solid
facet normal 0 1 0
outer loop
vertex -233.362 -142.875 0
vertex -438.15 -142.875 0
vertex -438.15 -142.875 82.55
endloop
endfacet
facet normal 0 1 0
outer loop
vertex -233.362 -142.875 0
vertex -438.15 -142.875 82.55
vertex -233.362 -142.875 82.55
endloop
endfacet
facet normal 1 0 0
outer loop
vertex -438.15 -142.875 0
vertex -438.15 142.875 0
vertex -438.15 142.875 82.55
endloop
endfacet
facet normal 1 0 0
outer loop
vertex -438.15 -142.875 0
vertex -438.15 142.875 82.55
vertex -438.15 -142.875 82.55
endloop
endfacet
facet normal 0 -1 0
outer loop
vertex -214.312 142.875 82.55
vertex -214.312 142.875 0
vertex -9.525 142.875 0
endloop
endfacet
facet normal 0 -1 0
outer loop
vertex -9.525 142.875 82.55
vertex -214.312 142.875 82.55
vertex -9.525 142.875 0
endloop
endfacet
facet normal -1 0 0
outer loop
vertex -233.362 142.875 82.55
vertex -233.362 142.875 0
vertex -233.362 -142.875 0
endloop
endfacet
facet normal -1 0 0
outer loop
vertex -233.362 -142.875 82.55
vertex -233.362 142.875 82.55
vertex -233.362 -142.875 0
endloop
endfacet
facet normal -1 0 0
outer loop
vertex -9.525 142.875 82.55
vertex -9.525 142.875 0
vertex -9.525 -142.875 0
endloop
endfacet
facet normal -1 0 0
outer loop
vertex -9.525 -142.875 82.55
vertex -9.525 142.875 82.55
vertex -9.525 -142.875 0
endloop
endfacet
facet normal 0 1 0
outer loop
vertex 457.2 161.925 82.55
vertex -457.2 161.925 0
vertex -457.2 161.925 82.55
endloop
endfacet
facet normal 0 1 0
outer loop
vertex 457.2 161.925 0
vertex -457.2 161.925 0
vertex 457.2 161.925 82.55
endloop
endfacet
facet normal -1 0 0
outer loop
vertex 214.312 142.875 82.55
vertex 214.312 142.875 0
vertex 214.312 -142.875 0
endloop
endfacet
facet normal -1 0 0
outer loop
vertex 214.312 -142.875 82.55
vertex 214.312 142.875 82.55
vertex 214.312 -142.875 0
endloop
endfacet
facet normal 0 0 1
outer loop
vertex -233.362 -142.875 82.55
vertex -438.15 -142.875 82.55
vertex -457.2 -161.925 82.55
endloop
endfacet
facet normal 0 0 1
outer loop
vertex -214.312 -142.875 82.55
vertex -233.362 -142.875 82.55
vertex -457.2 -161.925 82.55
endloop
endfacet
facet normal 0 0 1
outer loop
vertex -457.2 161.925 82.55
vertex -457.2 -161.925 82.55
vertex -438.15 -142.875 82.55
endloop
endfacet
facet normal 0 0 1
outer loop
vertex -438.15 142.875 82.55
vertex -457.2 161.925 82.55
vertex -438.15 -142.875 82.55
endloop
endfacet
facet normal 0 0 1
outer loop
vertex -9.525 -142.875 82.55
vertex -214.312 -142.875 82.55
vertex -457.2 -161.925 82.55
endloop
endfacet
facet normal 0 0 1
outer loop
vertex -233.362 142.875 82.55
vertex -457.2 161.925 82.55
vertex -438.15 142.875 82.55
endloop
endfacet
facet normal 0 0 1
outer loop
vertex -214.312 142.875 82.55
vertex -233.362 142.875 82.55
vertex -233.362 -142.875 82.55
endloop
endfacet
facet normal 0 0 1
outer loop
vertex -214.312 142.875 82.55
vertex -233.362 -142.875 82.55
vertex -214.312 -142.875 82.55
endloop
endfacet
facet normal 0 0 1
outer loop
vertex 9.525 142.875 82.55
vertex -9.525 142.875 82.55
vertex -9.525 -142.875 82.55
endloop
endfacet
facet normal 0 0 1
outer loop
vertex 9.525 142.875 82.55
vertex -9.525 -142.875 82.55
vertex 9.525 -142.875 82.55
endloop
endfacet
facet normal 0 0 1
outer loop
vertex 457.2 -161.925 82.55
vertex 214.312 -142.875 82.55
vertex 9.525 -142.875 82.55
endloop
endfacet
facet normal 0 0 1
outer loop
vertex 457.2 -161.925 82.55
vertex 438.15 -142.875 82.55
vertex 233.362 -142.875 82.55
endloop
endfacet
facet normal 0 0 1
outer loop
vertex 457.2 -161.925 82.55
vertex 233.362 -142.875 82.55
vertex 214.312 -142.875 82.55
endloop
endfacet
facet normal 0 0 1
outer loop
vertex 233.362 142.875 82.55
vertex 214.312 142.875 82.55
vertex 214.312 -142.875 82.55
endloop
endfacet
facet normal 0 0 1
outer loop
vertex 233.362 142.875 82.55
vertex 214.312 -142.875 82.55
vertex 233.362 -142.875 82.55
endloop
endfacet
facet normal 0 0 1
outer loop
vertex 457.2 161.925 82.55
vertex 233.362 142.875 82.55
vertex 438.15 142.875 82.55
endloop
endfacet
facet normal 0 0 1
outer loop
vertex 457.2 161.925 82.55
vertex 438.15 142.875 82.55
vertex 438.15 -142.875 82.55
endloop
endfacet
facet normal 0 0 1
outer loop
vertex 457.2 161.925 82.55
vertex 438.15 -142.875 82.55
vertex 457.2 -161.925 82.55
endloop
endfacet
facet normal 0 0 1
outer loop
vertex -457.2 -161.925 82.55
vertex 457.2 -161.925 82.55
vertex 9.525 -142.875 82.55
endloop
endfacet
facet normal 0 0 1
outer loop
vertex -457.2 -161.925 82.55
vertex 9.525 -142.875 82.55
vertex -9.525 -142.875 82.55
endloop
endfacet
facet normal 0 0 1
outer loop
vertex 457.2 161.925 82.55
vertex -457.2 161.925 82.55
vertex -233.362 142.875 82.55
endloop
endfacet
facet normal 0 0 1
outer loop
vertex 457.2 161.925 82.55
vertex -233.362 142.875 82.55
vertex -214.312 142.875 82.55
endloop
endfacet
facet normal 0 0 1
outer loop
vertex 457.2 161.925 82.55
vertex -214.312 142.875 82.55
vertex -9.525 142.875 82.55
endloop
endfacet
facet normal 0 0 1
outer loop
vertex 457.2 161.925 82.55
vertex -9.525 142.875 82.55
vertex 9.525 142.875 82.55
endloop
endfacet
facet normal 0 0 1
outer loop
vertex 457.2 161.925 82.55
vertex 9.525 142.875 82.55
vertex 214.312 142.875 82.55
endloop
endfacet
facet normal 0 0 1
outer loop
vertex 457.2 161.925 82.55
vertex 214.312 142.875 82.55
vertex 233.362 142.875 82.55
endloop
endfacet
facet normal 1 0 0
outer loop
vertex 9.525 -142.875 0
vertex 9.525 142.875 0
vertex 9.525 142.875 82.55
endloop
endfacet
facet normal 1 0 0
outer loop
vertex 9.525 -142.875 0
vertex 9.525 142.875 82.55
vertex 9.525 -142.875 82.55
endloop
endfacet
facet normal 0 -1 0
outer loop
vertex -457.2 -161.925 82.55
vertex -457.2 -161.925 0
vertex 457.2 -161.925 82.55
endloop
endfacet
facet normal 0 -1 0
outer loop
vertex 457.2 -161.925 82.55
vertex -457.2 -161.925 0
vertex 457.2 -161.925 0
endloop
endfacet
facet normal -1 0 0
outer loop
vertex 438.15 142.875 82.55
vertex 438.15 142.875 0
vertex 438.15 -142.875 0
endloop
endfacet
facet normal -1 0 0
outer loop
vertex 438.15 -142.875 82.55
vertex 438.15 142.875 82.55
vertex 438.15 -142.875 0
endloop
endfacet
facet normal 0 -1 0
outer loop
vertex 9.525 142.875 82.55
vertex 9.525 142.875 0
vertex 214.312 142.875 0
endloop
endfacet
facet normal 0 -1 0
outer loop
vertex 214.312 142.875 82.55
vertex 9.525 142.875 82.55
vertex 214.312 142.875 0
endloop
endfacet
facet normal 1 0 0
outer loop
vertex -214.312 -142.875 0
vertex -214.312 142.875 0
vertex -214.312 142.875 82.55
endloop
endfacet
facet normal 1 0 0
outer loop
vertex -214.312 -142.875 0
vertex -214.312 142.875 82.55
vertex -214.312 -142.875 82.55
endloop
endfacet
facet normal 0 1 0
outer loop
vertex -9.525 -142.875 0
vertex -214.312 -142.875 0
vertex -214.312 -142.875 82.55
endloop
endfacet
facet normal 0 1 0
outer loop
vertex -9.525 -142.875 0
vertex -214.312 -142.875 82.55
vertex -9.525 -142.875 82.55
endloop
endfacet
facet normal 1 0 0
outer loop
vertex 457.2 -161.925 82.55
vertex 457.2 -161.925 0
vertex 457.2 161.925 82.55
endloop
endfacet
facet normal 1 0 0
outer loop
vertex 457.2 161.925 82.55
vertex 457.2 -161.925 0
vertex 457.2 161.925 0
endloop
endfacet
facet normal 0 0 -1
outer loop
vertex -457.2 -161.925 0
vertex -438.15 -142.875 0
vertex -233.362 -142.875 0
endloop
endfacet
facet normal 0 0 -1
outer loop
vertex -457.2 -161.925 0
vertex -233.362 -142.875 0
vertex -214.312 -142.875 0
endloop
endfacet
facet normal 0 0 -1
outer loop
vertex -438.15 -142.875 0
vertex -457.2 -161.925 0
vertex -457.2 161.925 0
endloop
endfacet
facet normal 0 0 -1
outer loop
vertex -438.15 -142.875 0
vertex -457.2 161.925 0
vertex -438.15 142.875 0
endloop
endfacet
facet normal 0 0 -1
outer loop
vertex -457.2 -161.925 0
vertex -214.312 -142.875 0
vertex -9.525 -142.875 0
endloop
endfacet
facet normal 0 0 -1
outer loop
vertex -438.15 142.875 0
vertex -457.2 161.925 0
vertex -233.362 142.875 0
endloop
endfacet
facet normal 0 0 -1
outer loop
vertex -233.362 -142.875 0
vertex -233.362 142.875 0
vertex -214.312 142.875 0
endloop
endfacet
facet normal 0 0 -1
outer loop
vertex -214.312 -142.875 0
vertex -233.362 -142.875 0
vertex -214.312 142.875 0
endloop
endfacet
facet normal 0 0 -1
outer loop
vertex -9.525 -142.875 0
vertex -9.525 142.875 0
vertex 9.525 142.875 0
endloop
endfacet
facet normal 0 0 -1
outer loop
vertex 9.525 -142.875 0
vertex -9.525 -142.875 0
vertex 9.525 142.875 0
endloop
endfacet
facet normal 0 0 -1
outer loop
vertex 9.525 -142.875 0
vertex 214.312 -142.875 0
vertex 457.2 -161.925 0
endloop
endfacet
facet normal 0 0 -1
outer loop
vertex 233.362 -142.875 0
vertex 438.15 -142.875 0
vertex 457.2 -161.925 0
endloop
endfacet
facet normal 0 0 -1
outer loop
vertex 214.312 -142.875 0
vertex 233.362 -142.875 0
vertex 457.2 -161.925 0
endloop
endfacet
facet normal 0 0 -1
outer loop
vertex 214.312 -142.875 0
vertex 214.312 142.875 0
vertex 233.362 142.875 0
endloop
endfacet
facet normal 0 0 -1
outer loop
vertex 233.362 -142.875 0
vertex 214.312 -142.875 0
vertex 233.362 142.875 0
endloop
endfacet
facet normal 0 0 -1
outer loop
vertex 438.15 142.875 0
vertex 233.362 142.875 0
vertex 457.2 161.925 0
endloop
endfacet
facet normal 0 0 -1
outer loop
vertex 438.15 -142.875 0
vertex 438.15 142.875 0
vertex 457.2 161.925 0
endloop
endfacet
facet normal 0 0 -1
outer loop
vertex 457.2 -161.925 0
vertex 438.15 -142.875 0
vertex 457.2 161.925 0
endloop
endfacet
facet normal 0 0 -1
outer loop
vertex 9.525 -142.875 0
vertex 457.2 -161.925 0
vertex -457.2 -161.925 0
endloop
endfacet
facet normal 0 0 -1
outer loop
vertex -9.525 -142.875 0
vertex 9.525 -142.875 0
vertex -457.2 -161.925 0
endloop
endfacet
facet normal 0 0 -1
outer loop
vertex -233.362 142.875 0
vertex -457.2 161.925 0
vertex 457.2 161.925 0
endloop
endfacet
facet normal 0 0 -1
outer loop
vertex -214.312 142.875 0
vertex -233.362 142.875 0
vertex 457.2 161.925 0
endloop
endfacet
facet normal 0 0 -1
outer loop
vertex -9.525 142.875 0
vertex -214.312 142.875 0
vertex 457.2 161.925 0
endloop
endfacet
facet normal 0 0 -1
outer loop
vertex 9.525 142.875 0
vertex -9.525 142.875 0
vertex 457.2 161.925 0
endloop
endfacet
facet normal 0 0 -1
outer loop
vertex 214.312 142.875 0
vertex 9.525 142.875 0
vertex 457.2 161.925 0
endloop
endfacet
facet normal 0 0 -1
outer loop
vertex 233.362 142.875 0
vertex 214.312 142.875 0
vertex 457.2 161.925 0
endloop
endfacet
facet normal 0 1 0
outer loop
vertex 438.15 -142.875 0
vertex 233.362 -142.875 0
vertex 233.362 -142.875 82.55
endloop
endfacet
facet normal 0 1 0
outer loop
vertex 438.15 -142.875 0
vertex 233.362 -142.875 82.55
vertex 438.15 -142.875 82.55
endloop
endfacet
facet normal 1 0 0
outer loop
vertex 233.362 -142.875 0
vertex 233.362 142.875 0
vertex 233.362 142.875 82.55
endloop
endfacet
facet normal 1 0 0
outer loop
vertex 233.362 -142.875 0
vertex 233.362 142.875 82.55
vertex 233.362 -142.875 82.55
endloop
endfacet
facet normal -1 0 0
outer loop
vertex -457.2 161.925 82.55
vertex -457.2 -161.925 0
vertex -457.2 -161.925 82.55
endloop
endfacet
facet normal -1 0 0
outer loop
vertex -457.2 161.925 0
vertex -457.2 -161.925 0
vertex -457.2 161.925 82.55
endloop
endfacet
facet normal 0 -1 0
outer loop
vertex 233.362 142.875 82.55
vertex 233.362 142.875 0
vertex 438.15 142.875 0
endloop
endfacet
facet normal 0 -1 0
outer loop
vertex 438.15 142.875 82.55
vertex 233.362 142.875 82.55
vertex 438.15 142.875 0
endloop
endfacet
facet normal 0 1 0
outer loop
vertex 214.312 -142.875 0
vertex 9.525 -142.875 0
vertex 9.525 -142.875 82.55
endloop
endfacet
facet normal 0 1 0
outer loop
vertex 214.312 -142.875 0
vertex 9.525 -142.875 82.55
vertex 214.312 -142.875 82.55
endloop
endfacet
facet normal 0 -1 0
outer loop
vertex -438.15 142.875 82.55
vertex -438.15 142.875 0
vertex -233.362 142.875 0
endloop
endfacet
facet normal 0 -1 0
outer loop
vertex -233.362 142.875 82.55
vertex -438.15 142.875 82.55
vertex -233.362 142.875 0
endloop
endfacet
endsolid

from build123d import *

# Parameters (mm, degrees)
F0_W     = 914.4
F0_H     = 323.85
F1_DEPTH = 82.55
F2_W     = 876.3
F2_H     = 285.75
F3_DEPTH = 82.55
F4_W     = 19.05
F4_H     = 285.75
F5_DEPTH = 82.55
F6_W     = 19.05
F6_H     = 285.75
F7_DEPTH = 82.55
F8_W     = 19.05
F8_H     = 285.75
F9_DEPTH = 82.55


with BuildPart() as f1:
    # F0 (on Top) → F1 (new body)
    with BuildSketch(Plane.XY):
        Rectangle(F0_W, F0_H)
    extrude(amount=F1_DEPTH)

    # F2 (on face) → F3 (cut)
    with BuildSketch(Plane(origin=(0, 0, 0), x_dir=(1, 0, 0), z_dir=(0, 0, -1))):
        Rectangle(F2_W, F2_H)
    extrude(amount=-F3_DEPTH, mode=Mode.SUBTRACT)

    # F4 (on face) → F5 (join)
    with BuildSketch(Plane(origin=(0, 0, 0), x_dir=(1, 0, 0), z_dir=(0, 0, -1))):
        Rectangle(F4_W, F4_H)
    extrude(amount=-F5_DEPTH)

    # F6 (on face) → F7 (join)
    with BuildSketch(Plane(origin=(0, 0, 0), x_dir=(1, 0, 0), z_dir=(0, 0, -1))):
        with Locations((-223.8375, 0)):
            Rectangle(F6_W, F6_H)
    extrude(amount=-F7_DEPTH)

    # F8 (on face) → F9 (join)
    with BuildSketch(Plane(origin=(0, 0, 0), x_dir=(1, 0, 0), z_dir=(0, 0, -1))):
        with Locations((223.8375, 0)):
            Rectangle(F8_W, F8_H)
    extrude(amount=-F9_DEPTH)


solid = f1.part
